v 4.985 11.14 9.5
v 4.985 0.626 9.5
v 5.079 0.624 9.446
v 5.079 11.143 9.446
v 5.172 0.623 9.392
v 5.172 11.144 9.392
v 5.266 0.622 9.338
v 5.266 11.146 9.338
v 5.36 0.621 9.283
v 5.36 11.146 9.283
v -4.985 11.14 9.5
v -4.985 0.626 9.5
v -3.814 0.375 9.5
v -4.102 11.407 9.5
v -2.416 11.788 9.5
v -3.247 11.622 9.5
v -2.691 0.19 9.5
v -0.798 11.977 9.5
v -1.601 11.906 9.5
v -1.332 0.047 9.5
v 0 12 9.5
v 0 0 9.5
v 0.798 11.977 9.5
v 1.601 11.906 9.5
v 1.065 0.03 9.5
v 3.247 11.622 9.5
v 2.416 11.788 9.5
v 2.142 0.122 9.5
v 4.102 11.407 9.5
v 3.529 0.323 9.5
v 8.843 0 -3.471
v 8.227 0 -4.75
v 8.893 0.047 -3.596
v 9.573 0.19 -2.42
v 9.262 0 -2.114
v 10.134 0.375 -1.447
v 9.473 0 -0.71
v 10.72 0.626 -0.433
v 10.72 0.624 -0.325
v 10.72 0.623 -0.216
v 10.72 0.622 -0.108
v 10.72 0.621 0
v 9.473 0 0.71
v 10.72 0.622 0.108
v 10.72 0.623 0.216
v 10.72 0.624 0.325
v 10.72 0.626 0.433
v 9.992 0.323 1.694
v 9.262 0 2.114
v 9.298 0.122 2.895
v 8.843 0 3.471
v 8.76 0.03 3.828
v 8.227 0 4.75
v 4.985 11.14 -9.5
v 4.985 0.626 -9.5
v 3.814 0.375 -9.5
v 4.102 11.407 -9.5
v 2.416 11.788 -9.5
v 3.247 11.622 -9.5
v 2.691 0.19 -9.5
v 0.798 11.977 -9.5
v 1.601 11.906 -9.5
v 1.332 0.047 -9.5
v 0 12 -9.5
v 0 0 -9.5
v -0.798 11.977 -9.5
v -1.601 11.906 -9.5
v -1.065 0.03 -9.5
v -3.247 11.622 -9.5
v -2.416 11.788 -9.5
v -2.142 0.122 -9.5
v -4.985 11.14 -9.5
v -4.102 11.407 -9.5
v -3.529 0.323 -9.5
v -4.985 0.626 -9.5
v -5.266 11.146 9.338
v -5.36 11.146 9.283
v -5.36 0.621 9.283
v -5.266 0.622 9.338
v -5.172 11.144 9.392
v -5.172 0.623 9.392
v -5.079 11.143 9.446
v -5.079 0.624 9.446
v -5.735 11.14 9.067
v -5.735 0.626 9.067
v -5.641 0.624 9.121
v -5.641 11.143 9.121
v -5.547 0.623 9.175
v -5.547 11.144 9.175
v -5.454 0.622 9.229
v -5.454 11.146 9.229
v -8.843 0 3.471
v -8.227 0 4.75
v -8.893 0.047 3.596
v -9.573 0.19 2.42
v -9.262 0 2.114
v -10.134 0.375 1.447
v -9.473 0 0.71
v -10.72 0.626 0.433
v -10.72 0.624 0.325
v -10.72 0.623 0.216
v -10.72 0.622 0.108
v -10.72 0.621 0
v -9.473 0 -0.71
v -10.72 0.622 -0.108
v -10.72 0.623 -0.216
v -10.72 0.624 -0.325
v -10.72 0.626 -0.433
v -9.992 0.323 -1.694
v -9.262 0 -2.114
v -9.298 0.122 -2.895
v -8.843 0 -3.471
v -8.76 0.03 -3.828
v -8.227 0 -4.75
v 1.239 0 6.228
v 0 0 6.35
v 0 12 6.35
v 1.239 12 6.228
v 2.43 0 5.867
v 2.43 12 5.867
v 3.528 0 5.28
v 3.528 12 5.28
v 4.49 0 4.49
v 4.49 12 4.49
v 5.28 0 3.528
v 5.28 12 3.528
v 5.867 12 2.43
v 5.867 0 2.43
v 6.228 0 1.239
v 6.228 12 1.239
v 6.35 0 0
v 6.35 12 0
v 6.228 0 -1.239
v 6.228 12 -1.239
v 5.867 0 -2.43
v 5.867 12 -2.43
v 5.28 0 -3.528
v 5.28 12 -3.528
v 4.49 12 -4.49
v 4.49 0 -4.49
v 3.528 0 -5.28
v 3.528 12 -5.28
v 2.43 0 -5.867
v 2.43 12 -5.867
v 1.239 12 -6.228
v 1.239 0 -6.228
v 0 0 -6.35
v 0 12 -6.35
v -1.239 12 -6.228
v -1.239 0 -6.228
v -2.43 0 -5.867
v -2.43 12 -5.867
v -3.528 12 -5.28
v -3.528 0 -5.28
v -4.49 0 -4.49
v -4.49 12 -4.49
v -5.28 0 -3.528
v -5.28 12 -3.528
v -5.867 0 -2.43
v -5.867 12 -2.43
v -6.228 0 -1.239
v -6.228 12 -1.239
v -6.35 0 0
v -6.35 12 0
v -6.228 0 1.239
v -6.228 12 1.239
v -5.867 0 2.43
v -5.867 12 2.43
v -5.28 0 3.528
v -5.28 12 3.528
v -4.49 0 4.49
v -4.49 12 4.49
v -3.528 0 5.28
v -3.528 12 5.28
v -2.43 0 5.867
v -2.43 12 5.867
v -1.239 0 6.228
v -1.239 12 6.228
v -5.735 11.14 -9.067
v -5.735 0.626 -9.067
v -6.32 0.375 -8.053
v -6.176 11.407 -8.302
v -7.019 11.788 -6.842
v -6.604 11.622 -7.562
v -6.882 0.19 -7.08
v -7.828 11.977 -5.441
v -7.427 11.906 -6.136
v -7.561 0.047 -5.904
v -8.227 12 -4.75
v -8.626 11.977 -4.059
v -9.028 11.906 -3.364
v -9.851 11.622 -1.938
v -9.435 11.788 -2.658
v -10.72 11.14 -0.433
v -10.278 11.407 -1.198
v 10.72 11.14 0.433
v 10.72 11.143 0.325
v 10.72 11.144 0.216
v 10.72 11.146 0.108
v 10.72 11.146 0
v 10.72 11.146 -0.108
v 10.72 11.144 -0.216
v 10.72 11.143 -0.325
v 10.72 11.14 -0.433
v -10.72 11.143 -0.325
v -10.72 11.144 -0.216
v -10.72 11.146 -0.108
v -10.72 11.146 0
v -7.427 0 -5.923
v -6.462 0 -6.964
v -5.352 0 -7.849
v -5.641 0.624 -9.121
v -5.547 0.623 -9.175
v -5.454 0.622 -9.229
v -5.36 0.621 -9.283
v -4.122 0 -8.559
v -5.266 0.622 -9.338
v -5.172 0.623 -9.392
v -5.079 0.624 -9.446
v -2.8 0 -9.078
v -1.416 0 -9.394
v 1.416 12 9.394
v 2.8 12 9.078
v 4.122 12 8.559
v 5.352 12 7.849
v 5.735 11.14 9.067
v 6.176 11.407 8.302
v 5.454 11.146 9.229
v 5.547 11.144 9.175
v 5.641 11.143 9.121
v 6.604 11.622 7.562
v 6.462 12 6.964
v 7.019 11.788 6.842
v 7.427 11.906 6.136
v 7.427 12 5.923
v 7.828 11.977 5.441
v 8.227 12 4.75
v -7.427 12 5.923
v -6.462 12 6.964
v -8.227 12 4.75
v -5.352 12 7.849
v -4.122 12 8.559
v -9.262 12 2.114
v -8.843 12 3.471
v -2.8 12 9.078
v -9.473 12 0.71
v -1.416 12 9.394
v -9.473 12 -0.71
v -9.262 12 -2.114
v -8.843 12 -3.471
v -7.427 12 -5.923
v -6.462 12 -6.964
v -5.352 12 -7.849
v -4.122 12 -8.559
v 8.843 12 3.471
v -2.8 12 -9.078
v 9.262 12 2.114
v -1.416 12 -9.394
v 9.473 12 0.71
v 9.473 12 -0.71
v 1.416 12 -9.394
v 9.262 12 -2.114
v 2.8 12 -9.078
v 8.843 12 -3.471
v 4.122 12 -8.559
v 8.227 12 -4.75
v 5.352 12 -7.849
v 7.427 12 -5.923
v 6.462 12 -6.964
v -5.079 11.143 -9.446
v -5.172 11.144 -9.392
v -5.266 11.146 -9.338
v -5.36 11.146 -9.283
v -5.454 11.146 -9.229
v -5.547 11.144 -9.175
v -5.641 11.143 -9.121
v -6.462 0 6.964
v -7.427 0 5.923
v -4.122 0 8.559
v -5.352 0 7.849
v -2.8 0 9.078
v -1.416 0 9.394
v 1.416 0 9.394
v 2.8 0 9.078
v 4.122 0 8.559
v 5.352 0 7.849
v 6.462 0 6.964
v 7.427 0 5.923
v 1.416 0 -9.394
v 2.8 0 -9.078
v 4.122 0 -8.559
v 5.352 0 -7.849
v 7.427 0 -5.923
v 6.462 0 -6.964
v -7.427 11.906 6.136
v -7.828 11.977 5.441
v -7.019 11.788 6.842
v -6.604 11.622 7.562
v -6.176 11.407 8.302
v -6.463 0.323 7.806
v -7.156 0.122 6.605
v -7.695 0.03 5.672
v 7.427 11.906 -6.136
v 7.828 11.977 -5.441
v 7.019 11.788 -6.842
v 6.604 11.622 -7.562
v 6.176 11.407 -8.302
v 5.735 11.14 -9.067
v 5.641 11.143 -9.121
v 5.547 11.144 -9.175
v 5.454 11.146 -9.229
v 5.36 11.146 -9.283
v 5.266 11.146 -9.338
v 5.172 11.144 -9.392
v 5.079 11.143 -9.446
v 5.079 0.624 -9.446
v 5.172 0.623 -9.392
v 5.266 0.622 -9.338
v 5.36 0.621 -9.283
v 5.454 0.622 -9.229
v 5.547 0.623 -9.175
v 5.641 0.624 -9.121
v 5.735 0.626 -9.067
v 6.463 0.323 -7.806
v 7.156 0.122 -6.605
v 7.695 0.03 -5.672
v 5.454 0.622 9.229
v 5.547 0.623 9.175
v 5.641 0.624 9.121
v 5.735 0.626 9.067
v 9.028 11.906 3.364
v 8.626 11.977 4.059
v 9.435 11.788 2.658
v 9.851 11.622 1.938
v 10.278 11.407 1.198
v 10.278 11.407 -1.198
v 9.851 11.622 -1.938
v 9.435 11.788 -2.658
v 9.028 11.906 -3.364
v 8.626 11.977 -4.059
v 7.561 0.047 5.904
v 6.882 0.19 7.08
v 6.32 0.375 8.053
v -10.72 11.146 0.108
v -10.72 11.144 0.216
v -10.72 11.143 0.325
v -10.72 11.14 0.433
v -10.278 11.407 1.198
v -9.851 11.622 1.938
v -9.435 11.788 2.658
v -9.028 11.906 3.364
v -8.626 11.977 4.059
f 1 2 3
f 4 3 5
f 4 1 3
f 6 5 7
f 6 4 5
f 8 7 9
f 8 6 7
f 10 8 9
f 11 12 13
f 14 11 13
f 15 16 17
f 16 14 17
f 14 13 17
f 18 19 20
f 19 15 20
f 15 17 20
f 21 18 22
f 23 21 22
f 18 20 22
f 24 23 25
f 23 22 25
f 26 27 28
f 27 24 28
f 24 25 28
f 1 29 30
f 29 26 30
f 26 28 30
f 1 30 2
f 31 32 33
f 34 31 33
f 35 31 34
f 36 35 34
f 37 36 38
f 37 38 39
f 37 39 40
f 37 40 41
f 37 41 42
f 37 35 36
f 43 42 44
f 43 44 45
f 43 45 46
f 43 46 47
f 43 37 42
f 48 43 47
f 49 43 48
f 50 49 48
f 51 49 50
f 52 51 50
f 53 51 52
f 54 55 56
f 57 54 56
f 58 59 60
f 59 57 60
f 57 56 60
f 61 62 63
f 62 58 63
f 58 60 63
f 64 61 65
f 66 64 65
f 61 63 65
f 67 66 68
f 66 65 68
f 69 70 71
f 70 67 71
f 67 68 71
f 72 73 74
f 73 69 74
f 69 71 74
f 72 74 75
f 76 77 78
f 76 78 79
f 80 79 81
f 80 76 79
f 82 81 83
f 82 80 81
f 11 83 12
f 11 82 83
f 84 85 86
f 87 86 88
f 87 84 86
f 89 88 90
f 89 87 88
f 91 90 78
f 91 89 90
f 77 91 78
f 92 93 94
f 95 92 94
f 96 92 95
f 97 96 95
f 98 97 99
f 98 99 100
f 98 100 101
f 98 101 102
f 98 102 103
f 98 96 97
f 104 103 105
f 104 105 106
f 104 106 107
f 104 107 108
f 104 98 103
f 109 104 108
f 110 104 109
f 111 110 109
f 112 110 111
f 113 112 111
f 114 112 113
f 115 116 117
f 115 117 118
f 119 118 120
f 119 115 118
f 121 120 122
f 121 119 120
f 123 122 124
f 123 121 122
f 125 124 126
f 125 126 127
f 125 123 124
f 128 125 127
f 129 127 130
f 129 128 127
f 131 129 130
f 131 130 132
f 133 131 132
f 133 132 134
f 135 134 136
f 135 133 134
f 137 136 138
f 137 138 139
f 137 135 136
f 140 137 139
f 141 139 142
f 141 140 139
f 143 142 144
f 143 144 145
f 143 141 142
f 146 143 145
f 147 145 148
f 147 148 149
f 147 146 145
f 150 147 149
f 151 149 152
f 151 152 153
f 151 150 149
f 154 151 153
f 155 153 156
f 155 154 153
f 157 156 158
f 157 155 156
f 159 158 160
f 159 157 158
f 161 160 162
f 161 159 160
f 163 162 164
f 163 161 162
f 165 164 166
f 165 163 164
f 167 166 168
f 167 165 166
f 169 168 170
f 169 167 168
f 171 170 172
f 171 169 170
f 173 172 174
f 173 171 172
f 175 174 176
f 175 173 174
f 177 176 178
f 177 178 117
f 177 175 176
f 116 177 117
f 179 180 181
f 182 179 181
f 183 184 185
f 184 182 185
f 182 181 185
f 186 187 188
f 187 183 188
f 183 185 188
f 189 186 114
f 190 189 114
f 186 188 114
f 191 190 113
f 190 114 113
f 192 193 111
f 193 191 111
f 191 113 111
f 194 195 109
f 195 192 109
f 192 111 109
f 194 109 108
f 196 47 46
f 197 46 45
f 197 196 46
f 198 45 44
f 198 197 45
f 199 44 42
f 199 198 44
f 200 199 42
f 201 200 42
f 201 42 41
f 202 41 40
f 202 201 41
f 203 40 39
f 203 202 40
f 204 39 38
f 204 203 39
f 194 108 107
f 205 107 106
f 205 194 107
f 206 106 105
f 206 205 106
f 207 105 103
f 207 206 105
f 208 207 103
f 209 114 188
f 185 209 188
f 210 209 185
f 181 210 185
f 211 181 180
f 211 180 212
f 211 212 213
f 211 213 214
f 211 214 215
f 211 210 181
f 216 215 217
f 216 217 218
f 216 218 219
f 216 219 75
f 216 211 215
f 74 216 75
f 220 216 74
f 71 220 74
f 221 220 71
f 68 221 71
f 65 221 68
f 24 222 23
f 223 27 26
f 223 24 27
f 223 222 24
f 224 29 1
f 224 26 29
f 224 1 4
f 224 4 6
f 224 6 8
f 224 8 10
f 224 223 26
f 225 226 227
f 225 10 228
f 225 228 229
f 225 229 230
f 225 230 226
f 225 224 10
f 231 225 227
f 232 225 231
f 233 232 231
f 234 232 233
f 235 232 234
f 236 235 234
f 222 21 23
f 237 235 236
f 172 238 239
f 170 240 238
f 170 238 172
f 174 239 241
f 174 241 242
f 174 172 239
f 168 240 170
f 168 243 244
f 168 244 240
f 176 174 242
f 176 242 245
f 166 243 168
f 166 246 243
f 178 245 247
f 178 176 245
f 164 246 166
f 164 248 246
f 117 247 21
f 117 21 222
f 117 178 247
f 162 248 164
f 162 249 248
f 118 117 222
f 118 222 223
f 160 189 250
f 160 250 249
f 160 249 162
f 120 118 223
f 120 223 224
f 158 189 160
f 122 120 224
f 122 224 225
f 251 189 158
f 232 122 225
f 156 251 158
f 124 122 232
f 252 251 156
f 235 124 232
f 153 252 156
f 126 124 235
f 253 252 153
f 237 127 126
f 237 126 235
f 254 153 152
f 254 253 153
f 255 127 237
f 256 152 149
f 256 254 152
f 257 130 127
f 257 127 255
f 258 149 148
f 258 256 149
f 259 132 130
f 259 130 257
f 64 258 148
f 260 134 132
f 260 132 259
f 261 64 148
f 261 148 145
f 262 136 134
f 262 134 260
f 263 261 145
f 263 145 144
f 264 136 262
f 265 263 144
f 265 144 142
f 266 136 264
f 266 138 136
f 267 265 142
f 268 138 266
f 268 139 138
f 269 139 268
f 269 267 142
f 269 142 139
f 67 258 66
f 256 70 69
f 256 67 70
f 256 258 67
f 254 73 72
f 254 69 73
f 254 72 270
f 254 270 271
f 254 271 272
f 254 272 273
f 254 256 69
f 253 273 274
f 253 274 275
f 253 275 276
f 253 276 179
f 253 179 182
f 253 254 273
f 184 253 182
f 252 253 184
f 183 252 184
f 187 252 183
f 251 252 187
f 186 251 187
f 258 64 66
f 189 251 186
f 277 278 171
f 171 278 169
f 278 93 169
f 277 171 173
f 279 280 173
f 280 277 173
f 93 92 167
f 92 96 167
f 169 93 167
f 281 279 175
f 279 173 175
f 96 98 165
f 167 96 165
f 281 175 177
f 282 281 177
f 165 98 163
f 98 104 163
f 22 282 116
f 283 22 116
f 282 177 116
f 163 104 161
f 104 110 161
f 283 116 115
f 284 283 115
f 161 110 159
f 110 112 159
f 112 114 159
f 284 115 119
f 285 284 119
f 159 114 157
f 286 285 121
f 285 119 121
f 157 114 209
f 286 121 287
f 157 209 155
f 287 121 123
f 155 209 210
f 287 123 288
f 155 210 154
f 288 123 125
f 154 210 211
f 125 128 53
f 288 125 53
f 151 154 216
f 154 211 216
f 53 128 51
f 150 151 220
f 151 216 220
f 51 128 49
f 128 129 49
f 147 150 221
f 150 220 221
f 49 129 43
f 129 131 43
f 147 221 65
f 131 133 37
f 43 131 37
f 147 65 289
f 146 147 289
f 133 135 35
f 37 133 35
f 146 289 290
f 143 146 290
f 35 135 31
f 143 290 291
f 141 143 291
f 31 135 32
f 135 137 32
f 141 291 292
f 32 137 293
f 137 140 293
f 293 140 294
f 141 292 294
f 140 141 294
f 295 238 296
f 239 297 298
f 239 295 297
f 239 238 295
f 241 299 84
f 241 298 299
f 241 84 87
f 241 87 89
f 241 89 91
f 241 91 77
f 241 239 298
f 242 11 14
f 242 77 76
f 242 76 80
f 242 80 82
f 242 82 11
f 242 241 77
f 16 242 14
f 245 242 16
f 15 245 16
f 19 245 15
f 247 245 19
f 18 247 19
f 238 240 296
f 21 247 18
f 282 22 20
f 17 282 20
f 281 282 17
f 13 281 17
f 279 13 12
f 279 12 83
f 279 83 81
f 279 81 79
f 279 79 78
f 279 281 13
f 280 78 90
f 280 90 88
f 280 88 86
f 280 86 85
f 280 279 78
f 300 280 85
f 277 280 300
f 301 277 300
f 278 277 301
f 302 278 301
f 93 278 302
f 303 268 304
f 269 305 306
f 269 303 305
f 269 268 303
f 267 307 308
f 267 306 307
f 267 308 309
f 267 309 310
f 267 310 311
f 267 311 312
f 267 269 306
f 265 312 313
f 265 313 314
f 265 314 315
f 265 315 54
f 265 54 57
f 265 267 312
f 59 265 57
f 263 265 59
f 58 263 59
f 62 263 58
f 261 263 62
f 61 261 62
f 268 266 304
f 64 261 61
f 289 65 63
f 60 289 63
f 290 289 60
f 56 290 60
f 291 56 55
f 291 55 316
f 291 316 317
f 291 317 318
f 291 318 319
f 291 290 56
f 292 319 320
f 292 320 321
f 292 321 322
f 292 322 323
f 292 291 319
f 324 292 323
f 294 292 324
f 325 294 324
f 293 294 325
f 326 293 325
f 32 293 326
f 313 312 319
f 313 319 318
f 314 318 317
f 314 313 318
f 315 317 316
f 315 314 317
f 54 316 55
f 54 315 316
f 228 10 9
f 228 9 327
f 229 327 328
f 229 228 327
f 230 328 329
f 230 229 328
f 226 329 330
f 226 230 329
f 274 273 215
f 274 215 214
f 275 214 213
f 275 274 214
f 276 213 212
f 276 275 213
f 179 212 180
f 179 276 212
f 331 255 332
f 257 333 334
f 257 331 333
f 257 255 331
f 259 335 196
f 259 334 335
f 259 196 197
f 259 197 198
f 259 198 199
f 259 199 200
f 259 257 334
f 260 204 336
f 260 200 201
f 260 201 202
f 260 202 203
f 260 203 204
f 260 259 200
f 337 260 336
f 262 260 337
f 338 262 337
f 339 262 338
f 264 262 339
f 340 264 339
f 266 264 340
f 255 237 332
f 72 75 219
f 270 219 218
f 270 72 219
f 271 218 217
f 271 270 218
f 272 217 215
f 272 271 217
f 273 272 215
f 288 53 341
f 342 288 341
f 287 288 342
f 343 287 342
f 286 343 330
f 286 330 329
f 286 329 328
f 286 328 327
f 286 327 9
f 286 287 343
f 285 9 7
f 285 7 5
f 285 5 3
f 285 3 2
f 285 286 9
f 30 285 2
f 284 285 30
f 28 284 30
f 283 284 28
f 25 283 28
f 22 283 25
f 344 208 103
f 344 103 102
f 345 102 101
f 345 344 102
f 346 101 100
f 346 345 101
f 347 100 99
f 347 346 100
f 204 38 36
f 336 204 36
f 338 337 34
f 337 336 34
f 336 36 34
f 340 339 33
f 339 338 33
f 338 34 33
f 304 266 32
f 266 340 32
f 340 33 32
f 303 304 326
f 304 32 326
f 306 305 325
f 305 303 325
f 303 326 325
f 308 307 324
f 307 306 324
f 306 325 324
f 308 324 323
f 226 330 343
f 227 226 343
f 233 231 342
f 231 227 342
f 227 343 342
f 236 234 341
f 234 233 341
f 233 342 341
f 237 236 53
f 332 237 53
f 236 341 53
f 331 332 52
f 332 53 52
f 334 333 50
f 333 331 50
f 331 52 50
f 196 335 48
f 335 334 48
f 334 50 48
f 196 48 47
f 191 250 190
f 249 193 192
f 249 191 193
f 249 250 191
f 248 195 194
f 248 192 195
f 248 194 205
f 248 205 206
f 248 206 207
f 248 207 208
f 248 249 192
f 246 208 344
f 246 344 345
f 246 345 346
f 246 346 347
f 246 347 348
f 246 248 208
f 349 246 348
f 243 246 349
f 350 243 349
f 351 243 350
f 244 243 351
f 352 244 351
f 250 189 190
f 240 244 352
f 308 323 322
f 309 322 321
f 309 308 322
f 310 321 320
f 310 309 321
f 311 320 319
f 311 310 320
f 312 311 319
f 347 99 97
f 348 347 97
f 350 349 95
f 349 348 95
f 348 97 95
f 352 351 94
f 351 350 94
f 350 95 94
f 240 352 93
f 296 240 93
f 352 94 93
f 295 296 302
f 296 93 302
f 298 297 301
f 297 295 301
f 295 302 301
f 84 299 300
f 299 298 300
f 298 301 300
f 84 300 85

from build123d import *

# Parameters (mm, degrees)
CROQUIS1_R              = 6.35
SALIENTE_EXTRUIR1_DEPTH = 12
CROQUIS2_R              = 52.802243625
CROQUIS2_R_2            = 9.5
CORTAR_EXTRUIR1_DEPTH   = 12
CORTAR_EXTRUIR1_DRAFT   = -55
CROQUIS3_R              = 41.337917096
CROQUIS3_R_2            = 9.5
CORTAR_EXTRUIR2_DEPTH   = 12
CORTAR_EXTRUIR2_DRAFT   = -63
CORTAR_EXTRUIR3_REACH   = 20.83
MATRIZC1_COUNT          = 6


with BuildPart() as part:
    # Croquis1 → Saliente-Extruir1 (new body)
    with BuildSketch(Plane(origin=(0, 0, 0), x_dir=(1, 0, 0), z_dir=(0, 1, 0))):
        Polygon((10.969655115, 0), (5.484827557, 9.5), (-5.484827557, 9.5), (-10.969655115, 0), (-5.484827557, -9.5), (5.484827557, -9.5), align=None)
        with Locations(Location((0, 0, 0), (0, 0, 270))):
            Circle(CROQUIS1_R, mode=Mode.SUBTRACT)
    extrude(amount=SALIENTE_EXTRUIR1_DEPTH)


with BuildPart() as cortar_extruir1_tool:
    # Croquis2 → Cortar-Extruir1 (with draft: the straight prism first)
    with BuildSketch(Plane(origin=(0, 12, 0), x_dir=(1, 0, 0), z_dir=(0, 1, 0))):
        Circle(CROQUIS2_R)
        Circle(CROQUIS2_R_2, mode=Mode.SUBTRACT)
    extrude(amount=-CORTAR_EXTRUIR1_DEPTH)
    # Cortar-Extruir1: the draft: its side faces are tilted about the plane it starts from
    cortar_extruir1_sides = [cortar_extruir1_tool.faces().sort_by_distance(p)[0] for p in [
        (-52.802243625, 6, 0),
        (-9.5, 6, 0),
    ]]
    draft(cortar_extruir1_sides, Plane(origin=(0, 12, 0), x_dir=(1, 0, 0), z_dir=(0, 1, 0)), CORTAR_EXTRUIR1_DRAFT)


with BuildPart() as part_1:
    add(part.part)

    # Cortar-Extruir1: cut by cortar_extruir1_tool
    add(cortar_extruir1_tool.part, mode=Mode.SUBTRACT)


with BuildPart() as cortar_extruir2_tool:
    # Croquis3 → Cortar-Extruir2 (with draft: the straight prism first)
    with BuildSketch(Plane.XZ):
        Circle(CROQUIS3_R)
        Circle(CROQUIS3_R_2, mode=Mode.SUBTRACT)
    extrude(amount=-CORTAR_EXTRUIR2_DEPTH)
    # Cortar-Extruir2: the draft: its side faces are tilted about the plane it starts from
    cortar_extruir2_sides = [cortar_extruir2_tool.faces().sort_by_distance(p)[0] for p in [
        (-41.337917096, 6, 0),
        (-9.5, 6, 0),
    ]]
    draft(cortar_extruir2_sides, Plane.XZ, CORTAR_EXTRUIR2_DRAFT)


with BuildPart() as part_2:
    add(part_1.part)

    # Cortar-Extruir2: cut by cortar_extruir2_tool
    add(cortar_extruir2_tool.part, mode=Mode.SUBTRACT)

    # Cortar-Extruir3: up to this cone (the profile starts inside it)
    cortar_extruir3_end = Plane(origin=(0, 12, 0), z_dir=(0, 1, 0)).offset(-16.84049077) * Cone(1.963e-06, 139.780687907, 71.221816836, align=(Align.CENTER, Align.CENTER, Align.MIN), mode=Mode.PRIVATE)
    # Croquis4 → Cortar-Extruir3 (cut, up to the surface)
    with BuildSketch(Plane(origin=(0, 12, 0), x_dir=(1, 0, 0), z_dir=(0, 1, 0)), mode=Mode.PRIVATE) as cortar_extruir3_sk1:
        Polygon((-5.359827557, 9.283493649), (-6.723359894, 8.496257887), (-7.318521333, 9.527107738), (-4.730369323, 11.021377998), (-4.135207884, 9.990528147), align=None)
    cortar_extruir3_tool1 = extrude(cortar_extruir3_sk1.sketch, amount=-CORTAR_EXTRUIR3_REACH, mode=Mode.PRIVATE) & cortar_extruir3_end
    cortar_extruir3 = cortar_extruir3_tool1.solids().sort_by_distance((-5.726865, 12, -9.758818))[0]
    add(cortar_extruir3, mode=Mode.SUBTRACT)

    # MatrizC1: Cortar-Extruir3 ×6 about axis
    matrizc1_axis = Axis((0, 12, 0), (0, 1, 0))
    for i in range(1, MATRIZC1_COUNT):
        add(cortar_extruir3.rotate(matrizc1_axis, i * 360 / MATRIZC1_COUNT), mode=Mode.SUBTRACT)


solid = part_2.part
